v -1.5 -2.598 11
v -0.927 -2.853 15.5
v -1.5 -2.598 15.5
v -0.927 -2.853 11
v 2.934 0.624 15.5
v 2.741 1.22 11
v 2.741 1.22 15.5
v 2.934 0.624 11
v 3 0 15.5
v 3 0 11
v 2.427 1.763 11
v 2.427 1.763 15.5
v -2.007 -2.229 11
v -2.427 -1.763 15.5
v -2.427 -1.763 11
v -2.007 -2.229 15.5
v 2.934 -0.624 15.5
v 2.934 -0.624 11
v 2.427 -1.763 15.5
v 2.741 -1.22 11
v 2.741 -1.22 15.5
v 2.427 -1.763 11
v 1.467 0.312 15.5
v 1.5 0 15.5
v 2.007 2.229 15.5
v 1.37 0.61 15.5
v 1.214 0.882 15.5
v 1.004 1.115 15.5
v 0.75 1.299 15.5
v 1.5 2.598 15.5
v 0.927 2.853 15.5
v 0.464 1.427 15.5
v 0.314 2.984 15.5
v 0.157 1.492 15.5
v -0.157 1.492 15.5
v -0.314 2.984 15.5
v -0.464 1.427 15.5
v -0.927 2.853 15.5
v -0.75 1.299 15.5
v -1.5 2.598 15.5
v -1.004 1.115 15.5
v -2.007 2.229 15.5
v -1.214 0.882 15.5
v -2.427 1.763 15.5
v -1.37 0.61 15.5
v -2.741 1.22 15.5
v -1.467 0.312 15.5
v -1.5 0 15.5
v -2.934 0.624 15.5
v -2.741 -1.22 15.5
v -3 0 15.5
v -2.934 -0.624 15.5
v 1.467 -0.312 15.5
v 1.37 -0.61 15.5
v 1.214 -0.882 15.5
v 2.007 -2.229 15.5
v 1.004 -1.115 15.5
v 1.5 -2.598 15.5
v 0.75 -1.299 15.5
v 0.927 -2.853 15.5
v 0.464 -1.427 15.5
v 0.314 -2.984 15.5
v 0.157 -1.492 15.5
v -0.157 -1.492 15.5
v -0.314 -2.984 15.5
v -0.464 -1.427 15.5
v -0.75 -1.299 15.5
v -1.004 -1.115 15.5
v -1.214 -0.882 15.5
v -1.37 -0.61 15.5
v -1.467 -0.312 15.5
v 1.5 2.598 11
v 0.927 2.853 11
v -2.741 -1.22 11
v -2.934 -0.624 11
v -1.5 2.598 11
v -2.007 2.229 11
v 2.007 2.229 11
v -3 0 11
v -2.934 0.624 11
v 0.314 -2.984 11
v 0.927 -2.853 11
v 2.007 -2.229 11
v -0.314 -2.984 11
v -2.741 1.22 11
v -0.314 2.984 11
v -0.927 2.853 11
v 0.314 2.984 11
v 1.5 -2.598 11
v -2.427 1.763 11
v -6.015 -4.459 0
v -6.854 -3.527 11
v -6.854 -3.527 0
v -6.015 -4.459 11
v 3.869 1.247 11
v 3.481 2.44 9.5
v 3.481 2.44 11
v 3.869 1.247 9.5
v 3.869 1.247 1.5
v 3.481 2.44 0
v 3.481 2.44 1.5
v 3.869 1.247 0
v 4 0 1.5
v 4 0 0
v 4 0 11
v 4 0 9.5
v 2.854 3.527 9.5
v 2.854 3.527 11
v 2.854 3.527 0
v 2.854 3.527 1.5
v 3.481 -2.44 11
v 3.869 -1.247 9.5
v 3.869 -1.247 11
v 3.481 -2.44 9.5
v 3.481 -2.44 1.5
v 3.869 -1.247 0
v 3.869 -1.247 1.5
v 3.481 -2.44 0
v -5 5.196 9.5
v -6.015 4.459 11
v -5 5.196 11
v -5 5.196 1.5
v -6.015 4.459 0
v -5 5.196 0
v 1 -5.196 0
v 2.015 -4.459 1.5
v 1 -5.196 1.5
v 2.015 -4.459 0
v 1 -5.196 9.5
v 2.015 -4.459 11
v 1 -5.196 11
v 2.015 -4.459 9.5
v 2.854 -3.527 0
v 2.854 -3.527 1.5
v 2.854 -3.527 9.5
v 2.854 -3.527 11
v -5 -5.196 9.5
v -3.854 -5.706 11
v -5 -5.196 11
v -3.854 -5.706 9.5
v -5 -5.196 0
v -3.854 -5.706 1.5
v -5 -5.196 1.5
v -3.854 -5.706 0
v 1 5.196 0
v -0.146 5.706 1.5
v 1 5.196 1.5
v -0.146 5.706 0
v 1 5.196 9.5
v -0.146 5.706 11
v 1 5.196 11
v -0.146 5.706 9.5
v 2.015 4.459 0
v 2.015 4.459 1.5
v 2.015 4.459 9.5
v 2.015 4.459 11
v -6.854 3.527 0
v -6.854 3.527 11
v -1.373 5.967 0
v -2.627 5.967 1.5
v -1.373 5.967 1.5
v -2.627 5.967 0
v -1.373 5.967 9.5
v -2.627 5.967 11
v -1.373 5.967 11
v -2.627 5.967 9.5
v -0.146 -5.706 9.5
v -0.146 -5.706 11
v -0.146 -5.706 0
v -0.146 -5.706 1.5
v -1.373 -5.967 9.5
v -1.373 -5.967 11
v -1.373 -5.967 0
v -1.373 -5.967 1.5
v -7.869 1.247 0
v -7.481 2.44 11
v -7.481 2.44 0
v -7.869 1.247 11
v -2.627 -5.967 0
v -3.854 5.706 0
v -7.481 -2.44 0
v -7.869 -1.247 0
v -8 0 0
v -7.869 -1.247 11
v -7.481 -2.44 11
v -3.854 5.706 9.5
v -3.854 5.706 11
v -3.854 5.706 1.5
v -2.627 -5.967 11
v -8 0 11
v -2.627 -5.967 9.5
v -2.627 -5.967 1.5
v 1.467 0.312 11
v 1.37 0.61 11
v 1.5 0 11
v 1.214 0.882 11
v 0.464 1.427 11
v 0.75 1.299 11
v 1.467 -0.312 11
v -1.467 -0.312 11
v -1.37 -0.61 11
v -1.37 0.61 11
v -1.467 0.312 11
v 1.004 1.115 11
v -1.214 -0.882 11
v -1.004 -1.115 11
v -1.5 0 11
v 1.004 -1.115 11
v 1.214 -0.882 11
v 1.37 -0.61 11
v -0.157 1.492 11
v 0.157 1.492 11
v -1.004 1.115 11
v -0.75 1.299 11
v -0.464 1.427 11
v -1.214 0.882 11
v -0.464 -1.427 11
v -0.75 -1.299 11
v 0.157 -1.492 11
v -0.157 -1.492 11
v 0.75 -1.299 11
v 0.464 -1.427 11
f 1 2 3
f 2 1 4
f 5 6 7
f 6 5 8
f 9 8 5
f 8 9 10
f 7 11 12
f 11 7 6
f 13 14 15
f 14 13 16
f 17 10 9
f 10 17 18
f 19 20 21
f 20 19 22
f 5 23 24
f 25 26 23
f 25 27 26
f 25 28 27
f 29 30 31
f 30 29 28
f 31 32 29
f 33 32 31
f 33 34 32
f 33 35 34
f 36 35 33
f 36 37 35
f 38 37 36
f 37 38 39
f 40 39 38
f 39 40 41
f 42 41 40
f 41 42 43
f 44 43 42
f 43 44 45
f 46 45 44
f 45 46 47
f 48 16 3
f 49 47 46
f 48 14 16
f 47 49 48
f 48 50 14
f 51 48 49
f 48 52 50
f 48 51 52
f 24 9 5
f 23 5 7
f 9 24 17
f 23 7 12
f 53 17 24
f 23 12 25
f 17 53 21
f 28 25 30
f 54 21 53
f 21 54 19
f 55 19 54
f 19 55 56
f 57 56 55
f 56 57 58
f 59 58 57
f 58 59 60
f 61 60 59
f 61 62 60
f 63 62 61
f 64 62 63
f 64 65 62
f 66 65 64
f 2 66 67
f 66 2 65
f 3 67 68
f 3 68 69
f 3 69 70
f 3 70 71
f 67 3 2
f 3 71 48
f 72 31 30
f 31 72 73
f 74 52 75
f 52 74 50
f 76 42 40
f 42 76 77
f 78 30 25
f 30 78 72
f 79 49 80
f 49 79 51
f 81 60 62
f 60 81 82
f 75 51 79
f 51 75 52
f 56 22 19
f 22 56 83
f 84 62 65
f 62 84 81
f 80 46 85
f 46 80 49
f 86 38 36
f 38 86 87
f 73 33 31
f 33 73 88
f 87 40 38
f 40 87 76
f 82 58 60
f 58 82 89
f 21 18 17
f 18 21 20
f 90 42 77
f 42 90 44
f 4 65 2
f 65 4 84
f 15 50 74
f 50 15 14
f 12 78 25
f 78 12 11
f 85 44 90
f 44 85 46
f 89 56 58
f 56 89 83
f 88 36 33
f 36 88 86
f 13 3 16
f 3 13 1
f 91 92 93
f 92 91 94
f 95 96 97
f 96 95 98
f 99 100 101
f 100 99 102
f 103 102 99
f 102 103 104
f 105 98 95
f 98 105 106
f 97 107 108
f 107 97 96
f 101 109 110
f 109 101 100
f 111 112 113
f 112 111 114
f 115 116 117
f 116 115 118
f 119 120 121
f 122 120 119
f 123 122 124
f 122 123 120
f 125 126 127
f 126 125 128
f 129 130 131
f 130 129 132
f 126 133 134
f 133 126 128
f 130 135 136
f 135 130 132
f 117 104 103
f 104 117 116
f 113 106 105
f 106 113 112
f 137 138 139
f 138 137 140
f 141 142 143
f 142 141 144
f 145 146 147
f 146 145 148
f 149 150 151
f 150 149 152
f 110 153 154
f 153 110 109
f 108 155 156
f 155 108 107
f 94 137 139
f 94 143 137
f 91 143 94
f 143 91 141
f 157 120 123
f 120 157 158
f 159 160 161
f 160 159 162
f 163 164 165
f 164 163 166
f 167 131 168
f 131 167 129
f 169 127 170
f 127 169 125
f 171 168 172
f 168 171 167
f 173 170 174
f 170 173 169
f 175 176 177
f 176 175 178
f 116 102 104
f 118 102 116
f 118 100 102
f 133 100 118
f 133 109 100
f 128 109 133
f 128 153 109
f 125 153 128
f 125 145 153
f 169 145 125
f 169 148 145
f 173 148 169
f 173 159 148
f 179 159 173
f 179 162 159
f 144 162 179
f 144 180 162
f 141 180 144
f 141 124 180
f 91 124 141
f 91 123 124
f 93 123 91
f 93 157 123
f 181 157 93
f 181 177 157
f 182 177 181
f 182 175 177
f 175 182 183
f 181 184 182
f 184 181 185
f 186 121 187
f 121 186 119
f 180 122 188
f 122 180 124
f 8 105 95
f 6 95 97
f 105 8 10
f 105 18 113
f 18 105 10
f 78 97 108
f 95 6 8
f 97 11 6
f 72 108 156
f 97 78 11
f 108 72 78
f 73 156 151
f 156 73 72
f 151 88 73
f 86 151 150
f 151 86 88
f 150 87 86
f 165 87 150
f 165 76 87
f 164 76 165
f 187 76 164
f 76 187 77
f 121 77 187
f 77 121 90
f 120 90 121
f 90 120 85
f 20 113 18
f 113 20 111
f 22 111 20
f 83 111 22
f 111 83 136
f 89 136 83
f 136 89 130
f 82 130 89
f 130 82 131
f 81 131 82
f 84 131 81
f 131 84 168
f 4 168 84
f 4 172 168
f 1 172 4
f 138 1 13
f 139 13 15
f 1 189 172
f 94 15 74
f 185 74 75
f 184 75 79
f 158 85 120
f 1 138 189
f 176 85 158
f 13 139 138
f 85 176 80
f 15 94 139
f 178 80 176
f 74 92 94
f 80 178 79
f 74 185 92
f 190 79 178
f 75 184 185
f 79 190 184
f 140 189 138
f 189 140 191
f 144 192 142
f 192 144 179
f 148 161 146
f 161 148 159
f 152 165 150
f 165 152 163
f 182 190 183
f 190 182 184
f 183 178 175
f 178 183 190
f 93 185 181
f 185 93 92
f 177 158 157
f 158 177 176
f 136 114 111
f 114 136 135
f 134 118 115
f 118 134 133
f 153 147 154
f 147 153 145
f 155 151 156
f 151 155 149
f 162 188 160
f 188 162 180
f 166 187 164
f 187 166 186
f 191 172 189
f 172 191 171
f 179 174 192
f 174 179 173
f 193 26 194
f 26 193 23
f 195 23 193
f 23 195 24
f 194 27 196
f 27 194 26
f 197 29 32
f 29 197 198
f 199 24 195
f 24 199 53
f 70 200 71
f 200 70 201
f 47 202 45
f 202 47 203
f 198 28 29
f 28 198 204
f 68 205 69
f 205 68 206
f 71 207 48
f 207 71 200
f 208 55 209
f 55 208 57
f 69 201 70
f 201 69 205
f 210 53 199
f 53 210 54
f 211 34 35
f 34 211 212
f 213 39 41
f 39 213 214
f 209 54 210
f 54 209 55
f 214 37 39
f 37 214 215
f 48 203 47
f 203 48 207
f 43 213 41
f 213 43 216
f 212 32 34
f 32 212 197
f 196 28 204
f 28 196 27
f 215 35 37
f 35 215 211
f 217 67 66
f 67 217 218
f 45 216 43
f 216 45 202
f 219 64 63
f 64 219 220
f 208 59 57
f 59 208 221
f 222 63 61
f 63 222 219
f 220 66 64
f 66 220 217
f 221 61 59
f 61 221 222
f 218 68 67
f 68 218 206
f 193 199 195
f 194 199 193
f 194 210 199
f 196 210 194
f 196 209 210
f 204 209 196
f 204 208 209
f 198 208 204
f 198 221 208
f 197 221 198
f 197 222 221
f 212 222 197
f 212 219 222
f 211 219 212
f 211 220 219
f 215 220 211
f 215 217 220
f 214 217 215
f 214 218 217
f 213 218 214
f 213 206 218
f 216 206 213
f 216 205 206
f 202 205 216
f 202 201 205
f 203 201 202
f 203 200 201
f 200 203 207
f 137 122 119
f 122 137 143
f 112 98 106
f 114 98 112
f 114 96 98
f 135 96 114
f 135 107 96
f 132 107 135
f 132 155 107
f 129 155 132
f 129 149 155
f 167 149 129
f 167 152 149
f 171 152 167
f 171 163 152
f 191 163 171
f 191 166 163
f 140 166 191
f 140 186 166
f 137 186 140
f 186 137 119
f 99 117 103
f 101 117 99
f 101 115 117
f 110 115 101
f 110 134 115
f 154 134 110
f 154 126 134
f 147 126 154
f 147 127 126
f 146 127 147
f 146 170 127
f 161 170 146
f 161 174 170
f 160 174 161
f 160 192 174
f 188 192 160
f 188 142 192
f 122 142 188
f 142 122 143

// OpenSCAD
PLATFORM_THICKNESS = 8;//6.2;
PLATFORM_DIA = 70;//58;
WALL_THICKNESS = 1.5;

MOUNT_DIA = 60;
MOUNT_ROD_LENGTH = 6;//10;
MOUNT_ROD_DIA = 6;
MOUNT_ROD_HOLE_DIA = 3;
MOUNT_BASE_DIA = 2 * MOUNT_ROD_DIA;
MOUNT_BASE_THICKNESS = PLATFORM_THICKNESS + 2 * WALL_THICKNESS;

$fn = 30;

module platform() {
  cylinder(d = PLATFORM_DIA*2/sqrt(3), h = PLATFORM_THICKNESS, $fn = 6);
}

module mount() {
  difference() {
    union() {
      translate([0, 0, MOUNT_BASE_THICKNESS - WALL_THICKNESS])
      cylinder(d = MOUNT_ROD_DIA, h = MOUNT_ROD_LENGTH);

      translate([-(max(0, PLATFORM_DIA - MOUNT_DIA))/2, 0, 0])
      translate([(MOUNT_BASE_DIA - MOUNT_ROD_DIA)/2, 0, 0])
      cylinder(d = MOUNT_BASE_DIA, h = MOUNT_BASE_THICKNESS);
    }

    translate([0, 0, MOUNT_BASE_THICKNESS])
    cylinder(d = MOUNT_ROD_HOLE_DIA, h = MOUNT_ROD_LENGTH - WALL_THICKNESS);

    #translate([MOUNT_DIA/2, 0, WALL_THICKNESS])
    rotate([0, 0, 30])
    platform();
  }
}

mount();
